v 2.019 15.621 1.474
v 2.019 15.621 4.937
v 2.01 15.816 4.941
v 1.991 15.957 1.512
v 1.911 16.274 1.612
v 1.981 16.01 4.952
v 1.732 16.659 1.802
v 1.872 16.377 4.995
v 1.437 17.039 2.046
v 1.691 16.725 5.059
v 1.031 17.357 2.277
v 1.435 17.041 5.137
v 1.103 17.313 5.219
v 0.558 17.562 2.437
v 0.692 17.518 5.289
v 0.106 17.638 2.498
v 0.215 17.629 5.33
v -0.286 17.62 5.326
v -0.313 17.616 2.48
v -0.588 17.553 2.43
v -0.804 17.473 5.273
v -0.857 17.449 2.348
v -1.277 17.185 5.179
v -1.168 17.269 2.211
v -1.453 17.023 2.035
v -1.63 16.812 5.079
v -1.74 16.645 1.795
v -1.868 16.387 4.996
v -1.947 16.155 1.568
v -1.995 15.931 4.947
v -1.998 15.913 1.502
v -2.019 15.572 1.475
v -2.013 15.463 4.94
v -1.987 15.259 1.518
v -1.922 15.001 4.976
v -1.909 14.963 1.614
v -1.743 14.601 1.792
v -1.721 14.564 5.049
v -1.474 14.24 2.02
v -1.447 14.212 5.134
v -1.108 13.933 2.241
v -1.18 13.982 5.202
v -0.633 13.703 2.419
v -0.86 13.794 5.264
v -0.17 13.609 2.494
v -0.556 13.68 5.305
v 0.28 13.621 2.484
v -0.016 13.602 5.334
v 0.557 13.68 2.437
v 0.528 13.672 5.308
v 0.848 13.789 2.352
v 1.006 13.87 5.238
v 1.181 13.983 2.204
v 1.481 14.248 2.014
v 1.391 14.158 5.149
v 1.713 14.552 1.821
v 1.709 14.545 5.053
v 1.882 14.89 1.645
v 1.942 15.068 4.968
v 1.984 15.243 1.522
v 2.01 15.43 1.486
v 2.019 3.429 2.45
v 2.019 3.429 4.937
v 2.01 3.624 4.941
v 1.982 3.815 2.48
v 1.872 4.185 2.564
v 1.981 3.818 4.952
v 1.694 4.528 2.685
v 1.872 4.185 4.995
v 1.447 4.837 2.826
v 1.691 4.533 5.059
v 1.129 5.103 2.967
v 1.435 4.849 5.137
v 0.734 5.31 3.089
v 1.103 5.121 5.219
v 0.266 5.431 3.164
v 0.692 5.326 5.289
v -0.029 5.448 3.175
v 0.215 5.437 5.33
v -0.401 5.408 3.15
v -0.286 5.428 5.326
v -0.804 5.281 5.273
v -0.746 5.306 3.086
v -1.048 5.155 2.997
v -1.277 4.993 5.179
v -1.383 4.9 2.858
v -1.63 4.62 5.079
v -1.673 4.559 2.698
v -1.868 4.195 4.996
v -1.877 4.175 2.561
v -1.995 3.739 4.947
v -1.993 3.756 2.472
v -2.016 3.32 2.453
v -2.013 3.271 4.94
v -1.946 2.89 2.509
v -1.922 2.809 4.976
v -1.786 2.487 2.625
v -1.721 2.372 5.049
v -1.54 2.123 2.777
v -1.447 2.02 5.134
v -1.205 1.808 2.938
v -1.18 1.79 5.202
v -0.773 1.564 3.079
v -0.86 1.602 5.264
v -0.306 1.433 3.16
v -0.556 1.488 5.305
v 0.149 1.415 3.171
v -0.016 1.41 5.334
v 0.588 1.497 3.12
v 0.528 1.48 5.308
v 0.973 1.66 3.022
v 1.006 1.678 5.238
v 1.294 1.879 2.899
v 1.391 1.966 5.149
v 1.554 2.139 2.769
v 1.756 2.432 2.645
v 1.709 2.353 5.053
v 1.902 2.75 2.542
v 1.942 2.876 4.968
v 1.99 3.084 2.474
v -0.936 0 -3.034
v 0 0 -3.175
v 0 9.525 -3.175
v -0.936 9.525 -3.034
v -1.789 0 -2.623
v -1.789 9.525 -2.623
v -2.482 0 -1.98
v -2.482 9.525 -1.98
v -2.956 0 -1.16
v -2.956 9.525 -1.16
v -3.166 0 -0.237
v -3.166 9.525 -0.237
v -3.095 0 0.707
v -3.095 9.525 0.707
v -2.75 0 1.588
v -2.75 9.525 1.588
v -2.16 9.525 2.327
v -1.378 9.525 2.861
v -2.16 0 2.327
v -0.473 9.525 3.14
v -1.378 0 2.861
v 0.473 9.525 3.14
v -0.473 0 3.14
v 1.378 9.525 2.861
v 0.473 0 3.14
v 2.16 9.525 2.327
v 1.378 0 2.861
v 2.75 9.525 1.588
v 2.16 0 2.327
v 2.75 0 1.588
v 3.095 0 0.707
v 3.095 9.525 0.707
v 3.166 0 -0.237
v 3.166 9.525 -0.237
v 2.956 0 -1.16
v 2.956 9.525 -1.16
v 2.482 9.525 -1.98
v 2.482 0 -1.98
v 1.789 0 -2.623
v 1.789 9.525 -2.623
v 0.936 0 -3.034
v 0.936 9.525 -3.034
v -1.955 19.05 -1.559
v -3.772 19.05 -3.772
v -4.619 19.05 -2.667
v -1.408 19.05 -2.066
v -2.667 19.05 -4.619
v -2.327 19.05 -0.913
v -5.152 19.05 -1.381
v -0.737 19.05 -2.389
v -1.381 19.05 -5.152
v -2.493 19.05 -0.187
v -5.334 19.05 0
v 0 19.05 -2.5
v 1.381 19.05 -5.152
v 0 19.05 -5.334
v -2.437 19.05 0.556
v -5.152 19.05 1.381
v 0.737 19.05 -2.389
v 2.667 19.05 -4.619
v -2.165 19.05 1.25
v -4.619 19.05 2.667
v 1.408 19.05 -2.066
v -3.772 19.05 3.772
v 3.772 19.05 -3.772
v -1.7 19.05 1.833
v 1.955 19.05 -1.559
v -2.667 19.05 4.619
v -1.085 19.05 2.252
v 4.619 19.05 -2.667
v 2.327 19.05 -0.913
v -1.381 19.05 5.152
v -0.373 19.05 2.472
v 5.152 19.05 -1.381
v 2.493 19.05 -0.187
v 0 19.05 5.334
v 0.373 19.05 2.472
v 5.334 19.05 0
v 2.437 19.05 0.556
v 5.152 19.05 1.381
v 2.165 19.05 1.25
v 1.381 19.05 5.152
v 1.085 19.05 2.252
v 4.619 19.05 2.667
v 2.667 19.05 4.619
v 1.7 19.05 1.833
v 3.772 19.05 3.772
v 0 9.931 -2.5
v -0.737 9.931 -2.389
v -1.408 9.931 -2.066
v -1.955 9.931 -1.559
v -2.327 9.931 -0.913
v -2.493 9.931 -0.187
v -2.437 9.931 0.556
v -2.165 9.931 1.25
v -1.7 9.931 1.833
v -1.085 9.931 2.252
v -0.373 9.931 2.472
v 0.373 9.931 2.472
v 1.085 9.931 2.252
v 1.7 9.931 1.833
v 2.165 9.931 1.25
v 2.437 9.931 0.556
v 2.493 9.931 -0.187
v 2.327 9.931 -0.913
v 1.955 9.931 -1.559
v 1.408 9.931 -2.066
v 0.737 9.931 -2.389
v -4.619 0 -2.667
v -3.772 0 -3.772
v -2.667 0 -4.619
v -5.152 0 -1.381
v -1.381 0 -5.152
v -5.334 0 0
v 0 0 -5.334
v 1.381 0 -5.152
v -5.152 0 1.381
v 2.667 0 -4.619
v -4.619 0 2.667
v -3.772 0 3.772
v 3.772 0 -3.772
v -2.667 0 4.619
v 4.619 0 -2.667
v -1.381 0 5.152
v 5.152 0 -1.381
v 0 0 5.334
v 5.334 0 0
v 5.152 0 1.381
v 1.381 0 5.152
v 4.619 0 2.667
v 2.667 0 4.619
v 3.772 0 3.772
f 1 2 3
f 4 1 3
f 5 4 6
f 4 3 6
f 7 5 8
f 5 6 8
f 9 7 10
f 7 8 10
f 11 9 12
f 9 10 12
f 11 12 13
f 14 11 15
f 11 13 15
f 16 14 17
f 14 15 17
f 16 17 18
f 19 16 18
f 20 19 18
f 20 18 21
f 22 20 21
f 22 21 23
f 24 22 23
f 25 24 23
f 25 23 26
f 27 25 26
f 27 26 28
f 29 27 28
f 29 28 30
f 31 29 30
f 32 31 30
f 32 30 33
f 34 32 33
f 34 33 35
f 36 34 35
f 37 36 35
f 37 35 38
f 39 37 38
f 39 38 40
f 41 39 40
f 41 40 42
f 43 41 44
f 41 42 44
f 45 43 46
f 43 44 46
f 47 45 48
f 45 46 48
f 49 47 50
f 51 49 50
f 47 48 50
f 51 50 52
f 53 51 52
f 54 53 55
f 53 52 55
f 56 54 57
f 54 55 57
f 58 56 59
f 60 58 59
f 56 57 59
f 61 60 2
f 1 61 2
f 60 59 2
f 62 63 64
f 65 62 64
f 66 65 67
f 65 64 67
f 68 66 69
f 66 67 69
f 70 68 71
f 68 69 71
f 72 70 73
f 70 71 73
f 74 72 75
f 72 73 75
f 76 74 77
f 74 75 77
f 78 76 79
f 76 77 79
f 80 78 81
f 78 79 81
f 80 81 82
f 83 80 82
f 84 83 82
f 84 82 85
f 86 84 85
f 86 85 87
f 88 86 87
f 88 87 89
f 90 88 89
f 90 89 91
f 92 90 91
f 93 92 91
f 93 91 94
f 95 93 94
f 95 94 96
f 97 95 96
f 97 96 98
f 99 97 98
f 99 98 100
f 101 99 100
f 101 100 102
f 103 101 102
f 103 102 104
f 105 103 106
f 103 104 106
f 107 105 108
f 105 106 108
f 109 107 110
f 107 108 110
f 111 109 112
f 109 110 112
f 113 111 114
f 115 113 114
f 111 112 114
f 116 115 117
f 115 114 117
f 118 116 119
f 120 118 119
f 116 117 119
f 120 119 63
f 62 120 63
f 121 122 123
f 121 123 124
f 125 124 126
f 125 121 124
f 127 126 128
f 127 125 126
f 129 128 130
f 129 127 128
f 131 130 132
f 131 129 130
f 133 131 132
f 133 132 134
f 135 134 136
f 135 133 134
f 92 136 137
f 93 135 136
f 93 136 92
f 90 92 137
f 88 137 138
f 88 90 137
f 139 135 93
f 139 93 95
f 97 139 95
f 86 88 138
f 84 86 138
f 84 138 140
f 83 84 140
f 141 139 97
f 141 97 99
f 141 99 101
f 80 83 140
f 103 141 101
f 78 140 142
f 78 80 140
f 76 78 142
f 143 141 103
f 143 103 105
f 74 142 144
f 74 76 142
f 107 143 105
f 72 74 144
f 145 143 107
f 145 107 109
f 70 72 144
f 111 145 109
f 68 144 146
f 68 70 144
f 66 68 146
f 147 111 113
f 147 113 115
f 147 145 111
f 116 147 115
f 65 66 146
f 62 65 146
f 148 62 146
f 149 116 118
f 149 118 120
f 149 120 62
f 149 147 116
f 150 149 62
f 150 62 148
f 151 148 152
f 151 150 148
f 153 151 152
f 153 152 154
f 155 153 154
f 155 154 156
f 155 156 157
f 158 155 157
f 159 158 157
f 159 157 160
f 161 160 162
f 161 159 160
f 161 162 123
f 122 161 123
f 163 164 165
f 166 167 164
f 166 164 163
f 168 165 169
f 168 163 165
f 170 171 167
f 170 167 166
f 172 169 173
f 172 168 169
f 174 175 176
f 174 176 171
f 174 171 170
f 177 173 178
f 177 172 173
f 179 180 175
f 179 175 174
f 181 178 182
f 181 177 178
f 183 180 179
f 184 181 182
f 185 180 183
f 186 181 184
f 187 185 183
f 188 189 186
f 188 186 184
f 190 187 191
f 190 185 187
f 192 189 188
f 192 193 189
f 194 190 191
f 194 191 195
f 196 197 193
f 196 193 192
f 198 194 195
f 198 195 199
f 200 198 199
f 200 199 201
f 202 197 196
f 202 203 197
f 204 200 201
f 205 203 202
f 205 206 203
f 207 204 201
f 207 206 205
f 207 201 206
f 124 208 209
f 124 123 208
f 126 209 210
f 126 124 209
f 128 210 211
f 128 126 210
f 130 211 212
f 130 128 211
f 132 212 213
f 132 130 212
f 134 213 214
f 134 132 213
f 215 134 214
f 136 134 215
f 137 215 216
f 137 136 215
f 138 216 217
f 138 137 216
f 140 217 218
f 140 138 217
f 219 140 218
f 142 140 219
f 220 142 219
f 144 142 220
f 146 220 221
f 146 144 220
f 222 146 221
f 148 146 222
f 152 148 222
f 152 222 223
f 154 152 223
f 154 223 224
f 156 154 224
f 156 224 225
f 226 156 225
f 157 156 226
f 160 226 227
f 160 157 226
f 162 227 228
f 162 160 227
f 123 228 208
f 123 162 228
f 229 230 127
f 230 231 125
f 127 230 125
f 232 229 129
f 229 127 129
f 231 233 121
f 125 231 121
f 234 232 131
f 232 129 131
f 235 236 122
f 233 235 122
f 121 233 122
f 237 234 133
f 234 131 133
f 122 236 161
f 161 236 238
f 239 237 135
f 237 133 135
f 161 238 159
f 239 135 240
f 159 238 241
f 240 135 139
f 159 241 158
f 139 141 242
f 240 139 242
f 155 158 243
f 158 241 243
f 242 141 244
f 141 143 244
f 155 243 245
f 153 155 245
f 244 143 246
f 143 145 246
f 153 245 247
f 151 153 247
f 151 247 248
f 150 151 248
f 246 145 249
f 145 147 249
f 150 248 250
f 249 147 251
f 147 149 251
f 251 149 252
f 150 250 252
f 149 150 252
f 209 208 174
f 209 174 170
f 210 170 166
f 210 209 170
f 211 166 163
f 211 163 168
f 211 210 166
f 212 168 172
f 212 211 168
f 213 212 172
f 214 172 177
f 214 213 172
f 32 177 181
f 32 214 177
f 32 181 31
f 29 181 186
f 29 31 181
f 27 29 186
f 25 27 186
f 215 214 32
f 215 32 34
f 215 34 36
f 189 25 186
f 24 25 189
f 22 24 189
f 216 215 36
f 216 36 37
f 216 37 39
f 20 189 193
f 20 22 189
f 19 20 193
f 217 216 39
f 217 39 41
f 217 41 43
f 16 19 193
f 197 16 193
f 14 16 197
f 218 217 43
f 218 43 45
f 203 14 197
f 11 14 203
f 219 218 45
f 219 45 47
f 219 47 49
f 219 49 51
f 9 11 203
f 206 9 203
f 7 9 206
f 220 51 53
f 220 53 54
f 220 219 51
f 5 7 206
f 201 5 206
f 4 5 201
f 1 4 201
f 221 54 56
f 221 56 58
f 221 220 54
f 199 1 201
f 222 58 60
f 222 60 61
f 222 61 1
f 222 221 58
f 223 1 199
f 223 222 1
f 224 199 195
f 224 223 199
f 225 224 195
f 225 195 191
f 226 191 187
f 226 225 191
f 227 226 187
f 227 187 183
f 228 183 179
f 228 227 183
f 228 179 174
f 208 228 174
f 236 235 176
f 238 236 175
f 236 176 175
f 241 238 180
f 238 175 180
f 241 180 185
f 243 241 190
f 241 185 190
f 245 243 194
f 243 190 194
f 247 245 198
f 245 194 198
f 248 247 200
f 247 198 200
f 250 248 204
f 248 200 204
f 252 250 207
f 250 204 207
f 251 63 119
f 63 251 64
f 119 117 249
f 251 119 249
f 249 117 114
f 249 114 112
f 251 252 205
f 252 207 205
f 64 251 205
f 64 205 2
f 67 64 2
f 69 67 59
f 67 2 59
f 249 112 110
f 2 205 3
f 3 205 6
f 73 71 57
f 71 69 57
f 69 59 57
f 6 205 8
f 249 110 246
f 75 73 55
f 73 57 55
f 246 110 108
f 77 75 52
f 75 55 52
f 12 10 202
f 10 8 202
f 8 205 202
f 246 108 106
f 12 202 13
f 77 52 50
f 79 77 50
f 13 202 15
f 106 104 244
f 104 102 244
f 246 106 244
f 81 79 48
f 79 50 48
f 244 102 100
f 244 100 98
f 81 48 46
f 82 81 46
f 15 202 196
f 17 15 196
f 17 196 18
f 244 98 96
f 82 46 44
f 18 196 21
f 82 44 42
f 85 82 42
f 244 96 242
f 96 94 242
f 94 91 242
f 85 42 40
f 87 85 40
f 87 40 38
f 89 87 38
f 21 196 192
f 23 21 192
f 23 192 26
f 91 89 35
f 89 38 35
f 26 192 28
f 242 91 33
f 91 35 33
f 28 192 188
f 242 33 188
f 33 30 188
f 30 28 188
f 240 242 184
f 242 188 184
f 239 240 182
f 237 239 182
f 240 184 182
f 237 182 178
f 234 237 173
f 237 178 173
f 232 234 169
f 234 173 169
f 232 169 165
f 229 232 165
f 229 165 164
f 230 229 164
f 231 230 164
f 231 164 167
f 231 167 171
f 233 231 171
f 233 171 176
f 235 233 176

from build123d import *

# Parameters (mm, degrees)
SKETCH1_W                   = 5.334
SKETCH1_H                   = 19.05
M3_5_CLEARANCE_HOLE1_REACH  = 21.654
M3_5_CLEARANCE_HOLE1_BORE_R = 2.0193
M3_5_CLEARANCE_HOLE2_REACH  = 21.654
M3_5_CLEARANCE_HOLE2_BORE_R = 2.0193


with BuildPart() as part:
    # Sketch1 → Revolve1 (revolve)
    with BuildSketch(Plane.XY, mode=Mode.PRIVATE) as revolve1_sk:
        with Locations((2.667, 9.525)):
            Rectangle(SKETCH1_W, SKETCH1_H)
    revolve(revolve1_sk.sketch.rotate(Axis((0, 19.05, 0), (0, -1, 0)), 270), axis=Axis((0, 19.05, 0), (0, -1, 0)))

    # Sketch2 → Hole1 (revolve, cut)
    with BuildSketch(Plane(origin=(0, 0, 0), x_dir=(0, 0, -1), z_dir=(1, 0, 0))):
        Polygon((0, 0), (0, 19.05), (2.5, 19.05), (2.5, 9.930580918), (3.175, 9.525), (3.175, 0), align=None)
    revolve(axis=Axis((0, -6.130023899, 0), (0, 1, 0)), mode=Mode.SUBTRACT)

    # M3.5 Clearance Hole1 bore (on position points) → M3.5 Clearance Hole1 (cut, up to next)
    with BuildSketch(Plane(origin=(0, 15.621, 5.334), x_dir=(1, 0, 0), z_dir=(0, 0, 1)), mode=Mode.PRIVATE) as m3_5_clearance_hole1_sk1:
        Circle(M3_5_CLEARANCE_HOLE1_BORE_R)
    m3_5_clearance_hole1_tool1 = extrude(m3_5_clearance_hole1_sk1.sketch, amount=-M3_5_CLEARANCE_HOLE1_REACH, mode=Mode.PRIVATE) & part.part
    add(m3_5_clearance_hole1_tool1.solids().sort_by_distance((0, 15.621, 5.334))[0], mode=Mode.SUBTRACT)

    # M3.5 Clearance Hole2 bore (on position points) → M3.5 Clearance Hole2 (cut, up to next)
    with BuildSketch(Plane(origin=(0, 3.429, 5.334), x_dir=(1, 0, 0), z_dir=(0, 0, 1)), mode=Mode.PRIVATE) as m3_5_clearance_hole2_sk1:
        Circle(M3_5_CLEARANCE_HOLE2_BORE_R)
    m3_5_clearance_hole2_tool1 = extrude(m3_5_clearance_hole2_sk1.sketch, amount=-M3_5_CLEARANCE_HOLE2_REACH, mode=Mode.PRIVATE) & part.part
    add(m3_5_clearance_hole2_tool1.solids().sort_by_distance((0, 3.429, 5.334))[0], mode=Mode.SUBTRACT)


solid = part.part
